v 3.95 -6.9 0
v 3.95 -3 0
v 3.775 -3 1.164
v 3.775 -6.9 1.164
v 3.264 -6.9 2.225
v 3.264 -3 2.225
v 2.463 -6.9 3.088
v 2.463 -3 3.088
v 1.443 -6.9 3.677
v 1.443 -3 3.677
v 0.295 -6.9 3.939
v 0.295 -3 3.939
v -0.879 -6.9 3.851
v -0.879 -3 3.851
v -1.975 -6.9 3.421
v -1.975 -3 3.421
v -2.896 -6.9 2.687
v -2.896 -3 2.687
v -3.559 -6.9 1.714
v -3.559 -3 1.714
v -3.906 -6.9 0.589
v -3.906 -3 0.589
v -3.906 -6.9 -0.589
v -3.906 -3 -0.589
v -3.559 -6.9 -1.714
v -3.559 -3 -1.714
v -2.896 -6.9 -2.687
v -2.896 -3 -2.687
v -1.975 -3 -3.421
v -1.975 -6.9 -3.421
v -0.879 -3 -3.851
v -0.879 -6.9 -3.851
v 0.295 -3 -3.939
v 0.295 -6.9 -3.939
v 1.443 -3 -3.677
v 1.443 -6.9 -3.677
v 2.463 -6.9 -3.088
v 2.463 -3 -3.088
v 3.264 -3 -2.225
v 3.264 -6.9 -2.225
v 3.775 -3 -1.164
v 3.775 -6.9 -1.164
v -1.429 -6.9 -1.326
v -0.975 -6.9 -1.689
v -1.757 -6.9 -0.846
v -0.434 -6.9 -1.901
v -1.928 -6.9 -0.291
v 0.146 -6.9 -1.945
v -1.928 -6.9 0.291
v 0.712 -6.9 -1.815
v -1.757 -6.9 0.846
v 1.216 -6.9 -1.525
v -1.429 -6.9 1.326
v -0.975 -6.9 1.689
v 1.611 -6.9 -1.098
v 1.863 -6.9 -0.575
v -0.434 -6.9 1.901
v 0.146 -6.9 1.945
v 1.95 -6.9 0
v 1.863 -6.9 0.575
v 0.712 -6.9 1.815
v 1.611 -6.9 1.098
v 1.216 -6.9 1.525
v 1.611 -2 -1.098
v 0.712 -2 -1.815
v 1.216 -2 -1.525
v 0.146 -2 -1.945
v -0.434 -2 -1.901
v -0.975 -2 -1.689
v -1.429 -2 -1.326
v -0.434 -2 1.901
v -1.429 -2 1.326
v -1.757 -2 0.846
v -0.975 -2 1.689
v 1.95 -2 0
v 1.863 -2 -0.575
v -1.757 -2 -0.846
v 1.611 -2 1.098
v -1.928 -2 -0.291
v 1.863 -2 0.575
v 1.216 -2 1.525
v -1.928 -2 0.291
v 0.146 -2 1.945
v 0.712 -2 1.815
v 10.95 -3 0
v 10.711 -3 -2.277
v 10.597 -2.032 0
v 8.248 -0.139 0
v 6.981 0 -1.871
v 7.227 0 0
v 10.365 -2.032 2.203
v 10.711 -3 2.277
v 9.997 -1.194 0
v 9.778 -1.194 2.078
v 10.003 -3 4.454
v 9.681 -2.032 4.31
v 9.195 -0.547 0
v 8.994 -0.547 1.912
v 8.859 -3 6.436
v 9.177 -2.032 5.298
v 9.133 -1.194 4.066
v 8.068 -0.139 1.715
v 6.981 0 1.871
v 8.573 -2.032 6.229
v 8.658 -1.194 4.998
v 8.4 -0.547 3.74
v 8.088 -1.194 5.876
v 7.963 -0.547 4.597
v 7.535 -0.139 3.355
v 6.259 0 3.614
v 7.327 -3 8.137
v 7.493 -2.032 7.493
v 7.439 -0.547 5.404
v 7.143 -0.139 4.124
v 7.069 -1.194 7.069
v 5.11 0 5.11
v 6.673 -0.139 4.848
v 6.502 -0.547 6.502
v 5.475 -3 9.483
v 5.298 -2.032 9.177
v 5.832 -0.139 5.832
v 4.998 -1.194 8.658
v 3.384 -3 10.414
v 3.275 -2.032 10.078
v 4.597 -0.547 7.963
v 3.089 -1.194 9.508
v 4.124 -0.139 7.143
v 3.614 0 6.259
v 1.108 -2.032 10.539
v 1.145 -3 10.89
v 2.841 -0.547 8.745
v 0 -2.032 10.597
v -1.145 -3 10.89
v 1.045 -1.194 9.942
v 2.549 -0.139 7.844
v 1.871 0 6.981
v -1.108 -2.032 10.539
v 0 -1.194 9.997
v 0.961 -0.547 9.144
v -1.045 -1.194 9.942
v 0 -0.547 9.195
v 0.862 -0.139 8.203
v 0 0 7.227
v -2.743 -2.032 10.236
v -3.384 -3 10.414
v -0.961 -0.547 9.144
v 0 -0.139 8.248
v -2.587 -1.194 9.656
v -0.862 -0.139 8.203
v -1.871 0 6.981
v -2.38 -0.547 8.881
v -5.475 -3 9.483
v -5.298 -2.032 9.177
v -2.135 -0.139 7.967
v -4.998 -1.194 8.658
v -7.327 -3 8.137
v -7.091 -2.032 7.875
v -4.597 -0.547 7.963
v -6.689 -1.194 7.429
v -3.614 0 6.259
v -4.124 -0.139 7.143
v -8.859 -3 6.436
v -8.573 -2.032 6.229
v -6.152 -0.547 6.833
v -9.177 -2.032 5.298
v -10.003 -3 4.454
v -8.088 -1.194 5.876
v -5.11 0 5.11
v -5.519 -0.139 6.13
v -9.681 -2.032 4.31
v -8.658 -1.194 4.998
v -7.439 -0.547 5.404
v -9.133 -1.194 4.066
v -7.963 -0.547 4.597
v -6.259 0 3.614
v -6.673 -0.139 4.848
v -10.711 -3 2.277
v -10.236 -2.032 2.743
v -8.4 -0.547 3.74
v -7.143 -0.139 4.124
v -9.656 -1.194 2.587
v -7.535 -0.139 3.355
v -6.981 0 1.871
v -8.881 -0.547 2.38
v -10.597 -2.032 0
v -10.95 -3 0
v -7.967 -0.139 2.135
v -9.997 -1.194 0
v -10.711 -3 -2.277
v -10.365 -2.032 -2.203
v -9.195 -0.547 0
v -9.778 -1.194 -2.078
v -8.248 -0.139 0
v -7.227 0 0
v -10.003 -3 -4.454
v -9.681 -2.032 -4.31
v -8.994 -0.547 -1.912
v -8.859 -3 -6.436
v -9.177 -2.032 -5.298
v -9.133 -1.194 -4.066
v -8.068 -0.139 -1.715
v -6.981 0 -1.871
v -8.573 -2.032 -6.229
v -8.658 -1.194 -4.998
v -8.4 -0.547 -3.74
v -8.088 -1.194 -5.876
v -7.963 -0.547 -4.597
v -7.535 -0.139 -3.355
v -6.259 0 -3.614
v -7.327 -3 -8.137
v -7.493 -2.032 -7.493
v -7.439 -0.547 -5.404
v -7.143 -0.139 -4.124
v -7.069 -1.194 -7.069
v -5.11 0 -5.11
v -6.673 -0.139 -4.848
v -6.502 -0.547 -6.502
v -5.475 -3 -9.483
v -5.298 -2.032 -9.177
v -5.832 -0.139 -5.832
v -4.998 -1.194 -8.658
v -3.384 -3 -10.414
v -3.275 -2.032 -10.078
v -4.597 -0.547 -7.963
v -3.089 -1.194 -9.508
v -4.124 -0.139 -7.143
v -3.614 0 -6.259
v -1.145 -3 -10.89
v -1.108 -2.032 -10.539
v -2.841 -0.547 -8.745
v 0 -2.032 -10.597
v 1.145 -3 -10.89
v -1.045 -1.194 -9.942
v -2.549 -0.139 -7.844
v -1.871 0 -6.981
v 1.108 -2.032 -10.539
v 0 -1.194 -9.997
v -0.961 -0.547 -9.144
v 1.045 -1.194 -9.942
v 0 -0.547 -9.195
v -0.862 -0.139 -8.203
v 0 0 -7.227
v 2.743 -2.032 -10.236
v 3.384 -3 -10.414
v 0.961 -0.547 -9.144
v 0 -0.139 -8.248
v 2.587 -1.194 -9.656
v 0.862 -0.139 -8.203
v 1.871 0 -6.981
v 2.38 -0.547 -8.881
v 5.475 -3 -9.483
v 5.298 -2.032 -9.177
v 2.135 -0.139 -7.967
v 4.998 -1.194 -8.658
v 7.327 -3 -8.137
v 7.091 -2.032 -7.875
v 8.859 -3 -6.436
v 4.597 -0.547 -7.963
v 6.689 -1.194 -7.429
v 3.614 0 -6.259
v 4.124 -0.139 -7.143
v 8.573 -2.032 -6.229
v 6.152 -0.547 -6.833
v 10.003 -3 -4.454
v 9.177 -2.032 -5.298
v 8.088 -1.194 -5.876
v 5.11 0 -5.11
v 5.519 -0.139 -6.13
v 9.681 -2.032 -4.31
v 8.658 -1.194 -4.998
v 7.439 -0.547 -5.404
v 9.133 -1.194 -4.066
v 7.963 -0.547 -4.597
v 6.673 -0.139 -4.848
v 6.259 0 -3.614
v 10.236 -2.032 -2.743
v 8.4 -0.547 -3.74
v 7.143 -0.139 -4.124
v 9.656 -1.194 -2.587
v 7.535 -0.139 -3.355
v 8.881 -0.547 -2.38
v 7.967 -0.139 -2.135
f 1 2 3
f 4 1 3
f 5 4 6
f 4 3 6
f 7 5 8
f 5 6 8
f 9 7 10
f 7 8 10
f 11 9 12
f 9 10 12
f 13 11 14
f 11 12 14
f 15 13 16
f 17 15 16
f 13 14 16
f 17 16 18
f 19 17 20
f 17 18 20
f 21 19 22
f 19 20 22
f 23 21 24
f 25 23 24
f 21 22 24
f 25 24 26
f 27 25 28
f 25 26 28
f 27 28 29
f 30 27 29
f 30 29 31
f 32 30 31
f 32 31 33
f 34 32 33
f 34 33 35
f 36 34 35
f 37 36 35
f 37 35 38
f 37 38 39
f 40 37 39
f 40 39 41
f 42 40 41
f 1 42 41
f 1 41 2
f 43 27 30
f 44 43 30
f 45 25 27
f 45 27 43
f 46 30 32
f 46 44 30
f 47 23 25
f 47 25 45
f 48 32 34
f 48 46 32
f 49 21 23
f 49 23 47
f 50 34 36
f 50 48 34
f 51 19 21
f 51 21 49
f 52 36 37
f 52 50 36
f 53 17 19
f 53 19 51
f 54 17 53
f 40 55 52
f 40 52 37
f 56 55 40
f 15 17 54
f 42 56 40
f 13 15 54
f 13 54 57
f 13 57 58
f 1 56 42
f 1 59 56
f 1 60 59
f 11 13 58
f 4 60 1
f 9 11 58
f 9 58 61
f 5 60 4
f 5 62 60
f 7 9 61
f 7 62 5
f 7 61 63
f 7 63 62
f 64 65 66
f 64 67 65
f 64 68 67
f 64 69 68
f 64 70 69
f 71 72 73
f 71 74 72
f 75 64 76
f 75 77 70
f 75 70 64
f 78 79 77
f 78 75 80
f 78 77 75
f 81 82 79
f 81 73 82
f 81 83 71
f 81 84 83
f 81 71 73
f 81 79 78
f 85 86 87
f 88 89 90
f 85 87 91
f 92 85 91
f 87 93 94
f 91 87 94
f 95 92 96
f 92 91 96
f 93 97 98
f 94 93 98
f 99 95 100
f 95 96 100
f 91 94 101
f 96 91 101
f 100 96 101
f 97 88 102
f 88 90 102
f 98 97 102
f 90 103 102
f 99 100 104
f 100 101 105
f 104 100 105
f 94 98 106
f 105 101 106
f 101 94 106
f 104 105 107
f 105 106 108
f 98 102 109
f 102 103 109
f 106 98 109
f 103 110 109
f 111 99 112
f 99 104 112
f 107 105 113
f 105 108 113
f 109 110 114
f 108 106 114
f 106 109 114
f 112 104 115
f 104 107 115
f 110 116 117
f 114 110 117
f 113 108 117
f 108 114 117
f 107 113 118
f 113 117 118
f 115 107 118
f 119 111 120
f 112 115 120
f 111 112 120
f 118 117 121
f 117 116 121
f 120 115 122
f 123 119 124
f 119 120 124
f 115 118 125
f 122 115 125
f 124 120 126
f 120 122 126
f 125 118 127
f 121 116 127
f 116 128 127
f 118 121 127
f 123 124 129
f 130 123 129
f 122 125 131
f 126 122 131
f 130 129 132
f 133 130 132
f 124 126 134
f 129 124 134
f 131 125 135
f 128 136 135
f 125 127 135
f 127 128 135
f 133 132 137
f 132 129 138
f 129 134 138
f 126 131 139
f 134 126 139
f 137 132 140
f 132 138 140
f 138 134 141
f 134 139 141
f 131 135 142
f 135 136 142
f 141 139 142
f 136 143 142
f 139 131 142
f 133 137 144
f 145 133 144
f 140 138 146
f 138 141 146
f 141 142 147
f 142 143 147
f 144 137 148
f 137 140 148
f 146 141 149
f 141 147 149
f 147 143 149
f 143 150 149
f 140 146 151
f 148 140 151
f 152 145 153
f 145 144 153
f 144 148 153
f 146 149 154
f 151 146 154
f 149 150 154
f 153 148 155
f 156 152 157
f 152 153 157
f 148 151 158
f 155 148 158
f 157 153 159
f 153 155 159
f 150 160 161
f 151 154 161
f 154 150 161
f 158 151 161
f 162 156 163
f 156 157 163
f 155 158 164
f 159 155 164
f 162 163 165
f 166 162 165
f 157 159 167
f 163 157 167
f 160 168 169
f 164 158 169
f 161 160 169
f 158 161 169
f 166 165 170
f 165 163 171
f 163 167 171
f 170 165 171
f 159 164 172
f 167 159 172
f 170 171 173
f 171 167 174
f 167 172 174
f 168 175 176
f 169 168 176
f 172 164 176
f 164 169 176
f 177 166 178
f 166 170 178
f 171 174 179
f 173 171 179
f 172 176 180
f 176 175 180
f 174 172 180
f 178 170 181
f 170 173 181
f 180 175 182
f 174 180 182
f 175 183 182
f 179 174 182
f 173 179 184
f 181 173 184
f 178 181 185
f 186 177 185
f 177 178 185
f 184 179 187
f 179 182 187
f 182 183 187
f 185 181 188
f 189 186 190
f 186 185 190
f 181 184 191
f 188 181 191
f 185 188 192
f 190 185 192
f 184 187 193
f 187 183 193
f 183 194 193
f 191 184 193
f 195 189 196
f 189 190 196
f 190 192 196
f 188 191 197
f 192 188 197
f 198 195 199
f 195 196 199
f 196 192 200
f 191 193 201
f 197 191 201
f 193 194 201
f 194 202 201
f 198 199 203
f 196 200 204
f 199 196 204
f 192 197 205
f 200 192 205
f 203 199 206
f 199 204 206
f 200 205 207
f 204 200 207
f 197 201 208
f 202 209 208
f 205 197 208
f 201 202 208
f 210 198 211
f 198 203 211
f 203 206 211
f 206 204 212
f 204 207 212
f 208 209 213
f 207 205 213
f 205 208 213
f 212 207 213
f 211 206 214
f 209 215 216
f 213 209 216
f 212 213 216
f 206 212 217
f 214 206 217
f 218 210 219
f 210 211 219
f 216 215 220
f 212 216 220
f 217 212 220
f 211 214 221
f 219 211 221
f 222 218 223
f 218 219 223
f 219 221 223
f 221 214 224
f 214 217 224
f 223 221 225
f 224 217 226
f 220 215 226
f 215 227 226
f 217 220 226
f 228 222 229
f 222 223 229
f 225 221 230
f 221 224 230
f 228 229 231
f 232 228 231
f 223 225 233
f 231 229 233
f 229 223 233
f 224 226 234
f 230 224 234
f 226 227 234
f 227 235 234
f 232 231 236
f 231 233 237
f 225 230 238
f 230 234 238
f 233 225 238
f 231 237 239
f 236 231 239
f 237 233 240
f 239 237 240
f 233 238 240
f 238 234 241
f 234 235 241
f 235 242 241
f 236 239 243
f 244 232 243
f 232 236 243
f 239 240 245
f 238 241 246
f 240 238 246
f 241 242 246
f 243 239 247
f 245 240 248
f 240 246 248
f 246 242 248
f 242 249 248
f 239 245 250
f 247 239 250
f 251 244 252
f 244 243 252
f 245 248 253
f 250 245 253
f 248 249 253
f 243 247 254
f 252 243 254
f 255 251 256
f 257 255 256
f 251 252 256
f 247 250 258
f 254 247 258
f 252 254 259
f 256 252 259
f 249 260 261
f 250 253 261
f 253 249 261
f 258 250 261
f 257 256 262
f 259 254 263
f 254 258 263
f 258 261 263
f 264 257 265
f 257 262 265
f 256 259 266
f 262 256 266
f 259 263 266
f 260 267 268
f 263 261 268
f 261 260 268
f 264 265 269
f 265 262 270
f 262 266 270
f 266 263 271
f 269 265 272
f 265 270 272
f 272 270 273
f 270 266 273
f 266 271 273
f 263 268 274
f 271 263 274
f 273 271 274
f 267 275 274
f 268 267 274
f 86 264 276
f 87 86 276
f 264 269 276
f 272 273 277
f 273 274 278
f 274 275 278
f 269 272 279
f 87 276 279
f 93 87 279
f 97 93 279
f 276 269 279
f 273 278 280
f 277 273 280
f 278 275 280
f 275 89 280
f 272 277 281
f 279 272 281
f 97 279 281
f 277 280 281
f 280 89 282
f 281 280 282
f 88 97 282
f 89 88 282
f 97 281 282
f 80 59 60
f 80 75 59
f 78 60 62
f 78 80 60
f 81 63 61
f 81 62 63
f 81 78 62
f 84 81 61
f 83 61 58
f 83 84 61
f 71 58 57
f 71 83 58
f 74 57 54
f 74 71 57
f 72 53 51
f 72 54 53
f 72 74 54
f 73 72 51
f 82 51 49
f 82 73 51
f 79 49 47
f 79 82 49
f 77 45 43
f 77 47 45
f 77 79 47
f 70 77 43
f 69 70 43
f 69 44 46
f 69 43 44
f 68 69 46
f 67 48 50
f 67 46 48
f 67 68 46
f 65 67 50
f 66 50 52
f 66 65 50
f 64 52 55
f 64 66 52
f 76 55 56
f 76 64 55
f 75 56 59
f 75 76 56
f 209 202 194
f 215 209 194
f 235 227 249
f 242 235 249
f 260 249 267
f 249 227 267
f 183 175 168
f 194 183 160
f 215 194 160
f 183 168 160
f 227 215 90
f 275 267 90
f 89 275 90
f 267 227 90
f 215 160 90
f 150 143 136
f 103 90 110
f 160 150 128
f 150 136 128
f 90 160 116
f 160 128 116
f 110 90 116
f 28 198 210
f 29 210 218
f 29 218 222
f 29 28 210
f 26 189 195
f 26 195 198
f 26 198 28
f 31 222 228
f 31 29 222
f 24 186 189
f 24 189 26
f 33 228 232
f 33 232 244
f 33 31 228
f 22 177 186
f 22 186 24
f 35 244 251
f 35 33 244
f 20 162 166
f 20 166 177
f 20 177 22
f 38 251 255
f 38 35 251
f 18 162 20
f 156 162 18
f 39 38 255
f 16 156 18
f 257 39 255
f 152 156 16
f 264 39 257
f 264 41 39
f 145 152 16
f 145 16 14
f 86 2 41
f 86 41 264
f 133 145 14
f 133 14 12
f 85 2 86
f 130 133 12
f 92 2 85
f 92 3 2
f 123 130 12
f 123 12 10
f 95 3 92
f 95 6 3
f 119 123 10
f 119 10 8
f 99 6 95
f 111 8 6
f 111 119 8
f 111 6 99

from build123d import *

# Parameters (mm, degrees)
F0_R     = 10.95
F1_DEPTH = 3
F2_R     = 3.95
F3_DEPTH = 6.9
F4_T     = -2


# Not quite as in the source:
# - a fillet or chamfer that OpenCascade refuses, or shapes differently, is made with other operations: its cross-section is extruded or revolved along the edge and cut away or added


with BuildPart() as f1:
    # F0 (on Front) → F1 (new body)
    with BuildSketch(Plane.XZ):
        Circle(F0_R)
    extrude(amount=F1_DEPTH)

    # F2 (on Front) → F3 (join)
    with BuildSketch(Plane.XZ):
        Circle(F2_R)
    extrude(amount=F3_DEPTH)

    # F4
    f4_openings = [f1.faces().sort_by_distance(p)[0] for p in [
        (0, -6.9, 0),
    ]]
    offset(amount=F4_T, openings=f4_openings, kind=Kind.INTERSECTION)

    # F5: fillet of radius 3.81 on 1 edges, made by hand

    # F5_s1 → F5_t2 (revolve, cut)
    with BuildSketch(Plane.XY):
        with BuildLine():
            ThreePointArc((10.95, -3), (9.6177045238, -0.843335206), (7.2270979062, 0))
            Line((7.2270979062, 0), (10.95, 0))
            Line((10.95, 0), (10.95, -3))
        make_face()
    revolve(axis=Axis((0, 0, 0), (0, -1, 0)), mode=Mode.SUBTRACT)


solid = f1.part
